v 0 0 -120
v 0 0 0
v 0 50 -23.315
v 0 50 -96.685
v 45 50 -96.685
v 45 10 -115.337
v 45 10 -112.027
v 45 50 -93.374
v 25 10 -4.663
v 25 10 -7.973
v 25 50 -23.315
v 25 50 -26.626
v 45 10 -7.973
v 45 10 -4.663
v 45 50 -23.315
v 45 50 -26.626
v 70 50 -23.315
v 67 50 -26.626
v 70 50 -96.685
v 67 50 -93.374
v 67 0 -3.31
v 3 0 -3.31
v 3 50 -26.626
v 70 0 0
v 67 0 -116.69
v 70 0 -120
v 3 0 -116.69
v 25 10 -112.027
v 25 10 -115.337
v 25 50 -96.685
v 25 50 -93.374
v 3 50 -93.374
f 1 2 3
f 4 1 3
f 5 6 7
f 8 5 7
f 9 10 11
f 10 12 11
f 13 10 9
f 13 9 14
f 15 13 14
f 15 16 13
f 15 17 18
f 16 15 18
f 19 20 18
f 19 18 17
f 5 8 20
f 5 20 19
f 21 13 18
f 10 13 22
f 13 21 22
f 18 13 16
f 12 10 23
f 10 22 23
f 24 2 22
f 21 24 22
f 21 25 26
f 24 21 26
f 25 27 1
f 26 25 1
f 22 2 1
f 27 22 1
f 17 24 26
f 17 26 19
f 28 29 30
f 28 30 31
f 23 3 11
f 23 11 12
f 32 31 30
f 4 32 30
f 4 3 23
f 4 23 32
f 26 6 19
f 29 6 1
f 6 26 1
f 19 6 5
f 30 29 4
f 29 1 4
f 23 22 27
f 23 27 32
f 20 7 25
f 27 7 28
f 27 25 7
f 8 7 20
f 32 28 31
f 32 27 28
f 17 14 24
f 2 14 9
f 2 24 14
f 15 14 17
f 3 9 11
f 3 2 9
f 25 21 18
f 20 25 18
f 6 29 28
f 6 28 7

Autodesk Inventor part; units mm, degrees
ref_plane "YZ Plane" through (0, 0, 0) normal (1, 0, 0) x (0, 1, 0)
ref_plane "XZ Plane" through (0, 0, 0) normal (0, 1, 0) x (-1, 0, 0)
ref_plane "XY Plane" through (0, 0, 0) normal (0, 0, 1) x (1, 0, 0)
sketch "Sketch1" plane through (0, 0, 0) normal (1, 0, 0) x (0, 1, 0)
  line L0 (0, 0) -> (0, -120)
  line L1 (0, -120) -> (50, -96.6846)
  line L2 (0, 0) -> (50, -23.3154)
  line L3 (50, -23.3154) -> (50, -96.6846)
  dimension "d0" = 120
  dimension "d1" = 65
  dimension "d2" = 65
  dimension "d3" = 50
  dimension "d4" = 50
extrude "Extrusion1" add sketch "Sketch1" along normal blind 70
shell "Shell1" thickness 3 removed faces 2 at (23.3333, 50, -72.2282) at (23.3333, 0, -40)
sketch "Sketch2" plane through (0, 50, -23.3154) normal (0, 1, 0) x (1, 0, 0)
  line L0 (35, 37.1714) -> (45, 37.1714) construction
  line L1 (35, 37.1714) -> (25, 37.1714) construction
  line L2 (0, 96.6846) -> (70, 96.6846) projected
  line L3 (25, 96.6846) -> (25, -23.3154)
  line L4 (0, -23.3154) -> (70, -23.3154) projected
  line L5 (45, 96.6846) -> (45, -23.3154)
  line L6 (45, -23.3154) -> (25, -23.3154)
  line L7 (25, 96.6846) -> (45, 96.6846)
  point P0 (45, -23.3154)
  dimension "d8" = 10
  dimension "d9" = 10
  dimension "d10" = 20
extrude "Extrusion2" cut sketch "Sketch2" against normal blind 40
properties part number "Pie_3DPrint"
